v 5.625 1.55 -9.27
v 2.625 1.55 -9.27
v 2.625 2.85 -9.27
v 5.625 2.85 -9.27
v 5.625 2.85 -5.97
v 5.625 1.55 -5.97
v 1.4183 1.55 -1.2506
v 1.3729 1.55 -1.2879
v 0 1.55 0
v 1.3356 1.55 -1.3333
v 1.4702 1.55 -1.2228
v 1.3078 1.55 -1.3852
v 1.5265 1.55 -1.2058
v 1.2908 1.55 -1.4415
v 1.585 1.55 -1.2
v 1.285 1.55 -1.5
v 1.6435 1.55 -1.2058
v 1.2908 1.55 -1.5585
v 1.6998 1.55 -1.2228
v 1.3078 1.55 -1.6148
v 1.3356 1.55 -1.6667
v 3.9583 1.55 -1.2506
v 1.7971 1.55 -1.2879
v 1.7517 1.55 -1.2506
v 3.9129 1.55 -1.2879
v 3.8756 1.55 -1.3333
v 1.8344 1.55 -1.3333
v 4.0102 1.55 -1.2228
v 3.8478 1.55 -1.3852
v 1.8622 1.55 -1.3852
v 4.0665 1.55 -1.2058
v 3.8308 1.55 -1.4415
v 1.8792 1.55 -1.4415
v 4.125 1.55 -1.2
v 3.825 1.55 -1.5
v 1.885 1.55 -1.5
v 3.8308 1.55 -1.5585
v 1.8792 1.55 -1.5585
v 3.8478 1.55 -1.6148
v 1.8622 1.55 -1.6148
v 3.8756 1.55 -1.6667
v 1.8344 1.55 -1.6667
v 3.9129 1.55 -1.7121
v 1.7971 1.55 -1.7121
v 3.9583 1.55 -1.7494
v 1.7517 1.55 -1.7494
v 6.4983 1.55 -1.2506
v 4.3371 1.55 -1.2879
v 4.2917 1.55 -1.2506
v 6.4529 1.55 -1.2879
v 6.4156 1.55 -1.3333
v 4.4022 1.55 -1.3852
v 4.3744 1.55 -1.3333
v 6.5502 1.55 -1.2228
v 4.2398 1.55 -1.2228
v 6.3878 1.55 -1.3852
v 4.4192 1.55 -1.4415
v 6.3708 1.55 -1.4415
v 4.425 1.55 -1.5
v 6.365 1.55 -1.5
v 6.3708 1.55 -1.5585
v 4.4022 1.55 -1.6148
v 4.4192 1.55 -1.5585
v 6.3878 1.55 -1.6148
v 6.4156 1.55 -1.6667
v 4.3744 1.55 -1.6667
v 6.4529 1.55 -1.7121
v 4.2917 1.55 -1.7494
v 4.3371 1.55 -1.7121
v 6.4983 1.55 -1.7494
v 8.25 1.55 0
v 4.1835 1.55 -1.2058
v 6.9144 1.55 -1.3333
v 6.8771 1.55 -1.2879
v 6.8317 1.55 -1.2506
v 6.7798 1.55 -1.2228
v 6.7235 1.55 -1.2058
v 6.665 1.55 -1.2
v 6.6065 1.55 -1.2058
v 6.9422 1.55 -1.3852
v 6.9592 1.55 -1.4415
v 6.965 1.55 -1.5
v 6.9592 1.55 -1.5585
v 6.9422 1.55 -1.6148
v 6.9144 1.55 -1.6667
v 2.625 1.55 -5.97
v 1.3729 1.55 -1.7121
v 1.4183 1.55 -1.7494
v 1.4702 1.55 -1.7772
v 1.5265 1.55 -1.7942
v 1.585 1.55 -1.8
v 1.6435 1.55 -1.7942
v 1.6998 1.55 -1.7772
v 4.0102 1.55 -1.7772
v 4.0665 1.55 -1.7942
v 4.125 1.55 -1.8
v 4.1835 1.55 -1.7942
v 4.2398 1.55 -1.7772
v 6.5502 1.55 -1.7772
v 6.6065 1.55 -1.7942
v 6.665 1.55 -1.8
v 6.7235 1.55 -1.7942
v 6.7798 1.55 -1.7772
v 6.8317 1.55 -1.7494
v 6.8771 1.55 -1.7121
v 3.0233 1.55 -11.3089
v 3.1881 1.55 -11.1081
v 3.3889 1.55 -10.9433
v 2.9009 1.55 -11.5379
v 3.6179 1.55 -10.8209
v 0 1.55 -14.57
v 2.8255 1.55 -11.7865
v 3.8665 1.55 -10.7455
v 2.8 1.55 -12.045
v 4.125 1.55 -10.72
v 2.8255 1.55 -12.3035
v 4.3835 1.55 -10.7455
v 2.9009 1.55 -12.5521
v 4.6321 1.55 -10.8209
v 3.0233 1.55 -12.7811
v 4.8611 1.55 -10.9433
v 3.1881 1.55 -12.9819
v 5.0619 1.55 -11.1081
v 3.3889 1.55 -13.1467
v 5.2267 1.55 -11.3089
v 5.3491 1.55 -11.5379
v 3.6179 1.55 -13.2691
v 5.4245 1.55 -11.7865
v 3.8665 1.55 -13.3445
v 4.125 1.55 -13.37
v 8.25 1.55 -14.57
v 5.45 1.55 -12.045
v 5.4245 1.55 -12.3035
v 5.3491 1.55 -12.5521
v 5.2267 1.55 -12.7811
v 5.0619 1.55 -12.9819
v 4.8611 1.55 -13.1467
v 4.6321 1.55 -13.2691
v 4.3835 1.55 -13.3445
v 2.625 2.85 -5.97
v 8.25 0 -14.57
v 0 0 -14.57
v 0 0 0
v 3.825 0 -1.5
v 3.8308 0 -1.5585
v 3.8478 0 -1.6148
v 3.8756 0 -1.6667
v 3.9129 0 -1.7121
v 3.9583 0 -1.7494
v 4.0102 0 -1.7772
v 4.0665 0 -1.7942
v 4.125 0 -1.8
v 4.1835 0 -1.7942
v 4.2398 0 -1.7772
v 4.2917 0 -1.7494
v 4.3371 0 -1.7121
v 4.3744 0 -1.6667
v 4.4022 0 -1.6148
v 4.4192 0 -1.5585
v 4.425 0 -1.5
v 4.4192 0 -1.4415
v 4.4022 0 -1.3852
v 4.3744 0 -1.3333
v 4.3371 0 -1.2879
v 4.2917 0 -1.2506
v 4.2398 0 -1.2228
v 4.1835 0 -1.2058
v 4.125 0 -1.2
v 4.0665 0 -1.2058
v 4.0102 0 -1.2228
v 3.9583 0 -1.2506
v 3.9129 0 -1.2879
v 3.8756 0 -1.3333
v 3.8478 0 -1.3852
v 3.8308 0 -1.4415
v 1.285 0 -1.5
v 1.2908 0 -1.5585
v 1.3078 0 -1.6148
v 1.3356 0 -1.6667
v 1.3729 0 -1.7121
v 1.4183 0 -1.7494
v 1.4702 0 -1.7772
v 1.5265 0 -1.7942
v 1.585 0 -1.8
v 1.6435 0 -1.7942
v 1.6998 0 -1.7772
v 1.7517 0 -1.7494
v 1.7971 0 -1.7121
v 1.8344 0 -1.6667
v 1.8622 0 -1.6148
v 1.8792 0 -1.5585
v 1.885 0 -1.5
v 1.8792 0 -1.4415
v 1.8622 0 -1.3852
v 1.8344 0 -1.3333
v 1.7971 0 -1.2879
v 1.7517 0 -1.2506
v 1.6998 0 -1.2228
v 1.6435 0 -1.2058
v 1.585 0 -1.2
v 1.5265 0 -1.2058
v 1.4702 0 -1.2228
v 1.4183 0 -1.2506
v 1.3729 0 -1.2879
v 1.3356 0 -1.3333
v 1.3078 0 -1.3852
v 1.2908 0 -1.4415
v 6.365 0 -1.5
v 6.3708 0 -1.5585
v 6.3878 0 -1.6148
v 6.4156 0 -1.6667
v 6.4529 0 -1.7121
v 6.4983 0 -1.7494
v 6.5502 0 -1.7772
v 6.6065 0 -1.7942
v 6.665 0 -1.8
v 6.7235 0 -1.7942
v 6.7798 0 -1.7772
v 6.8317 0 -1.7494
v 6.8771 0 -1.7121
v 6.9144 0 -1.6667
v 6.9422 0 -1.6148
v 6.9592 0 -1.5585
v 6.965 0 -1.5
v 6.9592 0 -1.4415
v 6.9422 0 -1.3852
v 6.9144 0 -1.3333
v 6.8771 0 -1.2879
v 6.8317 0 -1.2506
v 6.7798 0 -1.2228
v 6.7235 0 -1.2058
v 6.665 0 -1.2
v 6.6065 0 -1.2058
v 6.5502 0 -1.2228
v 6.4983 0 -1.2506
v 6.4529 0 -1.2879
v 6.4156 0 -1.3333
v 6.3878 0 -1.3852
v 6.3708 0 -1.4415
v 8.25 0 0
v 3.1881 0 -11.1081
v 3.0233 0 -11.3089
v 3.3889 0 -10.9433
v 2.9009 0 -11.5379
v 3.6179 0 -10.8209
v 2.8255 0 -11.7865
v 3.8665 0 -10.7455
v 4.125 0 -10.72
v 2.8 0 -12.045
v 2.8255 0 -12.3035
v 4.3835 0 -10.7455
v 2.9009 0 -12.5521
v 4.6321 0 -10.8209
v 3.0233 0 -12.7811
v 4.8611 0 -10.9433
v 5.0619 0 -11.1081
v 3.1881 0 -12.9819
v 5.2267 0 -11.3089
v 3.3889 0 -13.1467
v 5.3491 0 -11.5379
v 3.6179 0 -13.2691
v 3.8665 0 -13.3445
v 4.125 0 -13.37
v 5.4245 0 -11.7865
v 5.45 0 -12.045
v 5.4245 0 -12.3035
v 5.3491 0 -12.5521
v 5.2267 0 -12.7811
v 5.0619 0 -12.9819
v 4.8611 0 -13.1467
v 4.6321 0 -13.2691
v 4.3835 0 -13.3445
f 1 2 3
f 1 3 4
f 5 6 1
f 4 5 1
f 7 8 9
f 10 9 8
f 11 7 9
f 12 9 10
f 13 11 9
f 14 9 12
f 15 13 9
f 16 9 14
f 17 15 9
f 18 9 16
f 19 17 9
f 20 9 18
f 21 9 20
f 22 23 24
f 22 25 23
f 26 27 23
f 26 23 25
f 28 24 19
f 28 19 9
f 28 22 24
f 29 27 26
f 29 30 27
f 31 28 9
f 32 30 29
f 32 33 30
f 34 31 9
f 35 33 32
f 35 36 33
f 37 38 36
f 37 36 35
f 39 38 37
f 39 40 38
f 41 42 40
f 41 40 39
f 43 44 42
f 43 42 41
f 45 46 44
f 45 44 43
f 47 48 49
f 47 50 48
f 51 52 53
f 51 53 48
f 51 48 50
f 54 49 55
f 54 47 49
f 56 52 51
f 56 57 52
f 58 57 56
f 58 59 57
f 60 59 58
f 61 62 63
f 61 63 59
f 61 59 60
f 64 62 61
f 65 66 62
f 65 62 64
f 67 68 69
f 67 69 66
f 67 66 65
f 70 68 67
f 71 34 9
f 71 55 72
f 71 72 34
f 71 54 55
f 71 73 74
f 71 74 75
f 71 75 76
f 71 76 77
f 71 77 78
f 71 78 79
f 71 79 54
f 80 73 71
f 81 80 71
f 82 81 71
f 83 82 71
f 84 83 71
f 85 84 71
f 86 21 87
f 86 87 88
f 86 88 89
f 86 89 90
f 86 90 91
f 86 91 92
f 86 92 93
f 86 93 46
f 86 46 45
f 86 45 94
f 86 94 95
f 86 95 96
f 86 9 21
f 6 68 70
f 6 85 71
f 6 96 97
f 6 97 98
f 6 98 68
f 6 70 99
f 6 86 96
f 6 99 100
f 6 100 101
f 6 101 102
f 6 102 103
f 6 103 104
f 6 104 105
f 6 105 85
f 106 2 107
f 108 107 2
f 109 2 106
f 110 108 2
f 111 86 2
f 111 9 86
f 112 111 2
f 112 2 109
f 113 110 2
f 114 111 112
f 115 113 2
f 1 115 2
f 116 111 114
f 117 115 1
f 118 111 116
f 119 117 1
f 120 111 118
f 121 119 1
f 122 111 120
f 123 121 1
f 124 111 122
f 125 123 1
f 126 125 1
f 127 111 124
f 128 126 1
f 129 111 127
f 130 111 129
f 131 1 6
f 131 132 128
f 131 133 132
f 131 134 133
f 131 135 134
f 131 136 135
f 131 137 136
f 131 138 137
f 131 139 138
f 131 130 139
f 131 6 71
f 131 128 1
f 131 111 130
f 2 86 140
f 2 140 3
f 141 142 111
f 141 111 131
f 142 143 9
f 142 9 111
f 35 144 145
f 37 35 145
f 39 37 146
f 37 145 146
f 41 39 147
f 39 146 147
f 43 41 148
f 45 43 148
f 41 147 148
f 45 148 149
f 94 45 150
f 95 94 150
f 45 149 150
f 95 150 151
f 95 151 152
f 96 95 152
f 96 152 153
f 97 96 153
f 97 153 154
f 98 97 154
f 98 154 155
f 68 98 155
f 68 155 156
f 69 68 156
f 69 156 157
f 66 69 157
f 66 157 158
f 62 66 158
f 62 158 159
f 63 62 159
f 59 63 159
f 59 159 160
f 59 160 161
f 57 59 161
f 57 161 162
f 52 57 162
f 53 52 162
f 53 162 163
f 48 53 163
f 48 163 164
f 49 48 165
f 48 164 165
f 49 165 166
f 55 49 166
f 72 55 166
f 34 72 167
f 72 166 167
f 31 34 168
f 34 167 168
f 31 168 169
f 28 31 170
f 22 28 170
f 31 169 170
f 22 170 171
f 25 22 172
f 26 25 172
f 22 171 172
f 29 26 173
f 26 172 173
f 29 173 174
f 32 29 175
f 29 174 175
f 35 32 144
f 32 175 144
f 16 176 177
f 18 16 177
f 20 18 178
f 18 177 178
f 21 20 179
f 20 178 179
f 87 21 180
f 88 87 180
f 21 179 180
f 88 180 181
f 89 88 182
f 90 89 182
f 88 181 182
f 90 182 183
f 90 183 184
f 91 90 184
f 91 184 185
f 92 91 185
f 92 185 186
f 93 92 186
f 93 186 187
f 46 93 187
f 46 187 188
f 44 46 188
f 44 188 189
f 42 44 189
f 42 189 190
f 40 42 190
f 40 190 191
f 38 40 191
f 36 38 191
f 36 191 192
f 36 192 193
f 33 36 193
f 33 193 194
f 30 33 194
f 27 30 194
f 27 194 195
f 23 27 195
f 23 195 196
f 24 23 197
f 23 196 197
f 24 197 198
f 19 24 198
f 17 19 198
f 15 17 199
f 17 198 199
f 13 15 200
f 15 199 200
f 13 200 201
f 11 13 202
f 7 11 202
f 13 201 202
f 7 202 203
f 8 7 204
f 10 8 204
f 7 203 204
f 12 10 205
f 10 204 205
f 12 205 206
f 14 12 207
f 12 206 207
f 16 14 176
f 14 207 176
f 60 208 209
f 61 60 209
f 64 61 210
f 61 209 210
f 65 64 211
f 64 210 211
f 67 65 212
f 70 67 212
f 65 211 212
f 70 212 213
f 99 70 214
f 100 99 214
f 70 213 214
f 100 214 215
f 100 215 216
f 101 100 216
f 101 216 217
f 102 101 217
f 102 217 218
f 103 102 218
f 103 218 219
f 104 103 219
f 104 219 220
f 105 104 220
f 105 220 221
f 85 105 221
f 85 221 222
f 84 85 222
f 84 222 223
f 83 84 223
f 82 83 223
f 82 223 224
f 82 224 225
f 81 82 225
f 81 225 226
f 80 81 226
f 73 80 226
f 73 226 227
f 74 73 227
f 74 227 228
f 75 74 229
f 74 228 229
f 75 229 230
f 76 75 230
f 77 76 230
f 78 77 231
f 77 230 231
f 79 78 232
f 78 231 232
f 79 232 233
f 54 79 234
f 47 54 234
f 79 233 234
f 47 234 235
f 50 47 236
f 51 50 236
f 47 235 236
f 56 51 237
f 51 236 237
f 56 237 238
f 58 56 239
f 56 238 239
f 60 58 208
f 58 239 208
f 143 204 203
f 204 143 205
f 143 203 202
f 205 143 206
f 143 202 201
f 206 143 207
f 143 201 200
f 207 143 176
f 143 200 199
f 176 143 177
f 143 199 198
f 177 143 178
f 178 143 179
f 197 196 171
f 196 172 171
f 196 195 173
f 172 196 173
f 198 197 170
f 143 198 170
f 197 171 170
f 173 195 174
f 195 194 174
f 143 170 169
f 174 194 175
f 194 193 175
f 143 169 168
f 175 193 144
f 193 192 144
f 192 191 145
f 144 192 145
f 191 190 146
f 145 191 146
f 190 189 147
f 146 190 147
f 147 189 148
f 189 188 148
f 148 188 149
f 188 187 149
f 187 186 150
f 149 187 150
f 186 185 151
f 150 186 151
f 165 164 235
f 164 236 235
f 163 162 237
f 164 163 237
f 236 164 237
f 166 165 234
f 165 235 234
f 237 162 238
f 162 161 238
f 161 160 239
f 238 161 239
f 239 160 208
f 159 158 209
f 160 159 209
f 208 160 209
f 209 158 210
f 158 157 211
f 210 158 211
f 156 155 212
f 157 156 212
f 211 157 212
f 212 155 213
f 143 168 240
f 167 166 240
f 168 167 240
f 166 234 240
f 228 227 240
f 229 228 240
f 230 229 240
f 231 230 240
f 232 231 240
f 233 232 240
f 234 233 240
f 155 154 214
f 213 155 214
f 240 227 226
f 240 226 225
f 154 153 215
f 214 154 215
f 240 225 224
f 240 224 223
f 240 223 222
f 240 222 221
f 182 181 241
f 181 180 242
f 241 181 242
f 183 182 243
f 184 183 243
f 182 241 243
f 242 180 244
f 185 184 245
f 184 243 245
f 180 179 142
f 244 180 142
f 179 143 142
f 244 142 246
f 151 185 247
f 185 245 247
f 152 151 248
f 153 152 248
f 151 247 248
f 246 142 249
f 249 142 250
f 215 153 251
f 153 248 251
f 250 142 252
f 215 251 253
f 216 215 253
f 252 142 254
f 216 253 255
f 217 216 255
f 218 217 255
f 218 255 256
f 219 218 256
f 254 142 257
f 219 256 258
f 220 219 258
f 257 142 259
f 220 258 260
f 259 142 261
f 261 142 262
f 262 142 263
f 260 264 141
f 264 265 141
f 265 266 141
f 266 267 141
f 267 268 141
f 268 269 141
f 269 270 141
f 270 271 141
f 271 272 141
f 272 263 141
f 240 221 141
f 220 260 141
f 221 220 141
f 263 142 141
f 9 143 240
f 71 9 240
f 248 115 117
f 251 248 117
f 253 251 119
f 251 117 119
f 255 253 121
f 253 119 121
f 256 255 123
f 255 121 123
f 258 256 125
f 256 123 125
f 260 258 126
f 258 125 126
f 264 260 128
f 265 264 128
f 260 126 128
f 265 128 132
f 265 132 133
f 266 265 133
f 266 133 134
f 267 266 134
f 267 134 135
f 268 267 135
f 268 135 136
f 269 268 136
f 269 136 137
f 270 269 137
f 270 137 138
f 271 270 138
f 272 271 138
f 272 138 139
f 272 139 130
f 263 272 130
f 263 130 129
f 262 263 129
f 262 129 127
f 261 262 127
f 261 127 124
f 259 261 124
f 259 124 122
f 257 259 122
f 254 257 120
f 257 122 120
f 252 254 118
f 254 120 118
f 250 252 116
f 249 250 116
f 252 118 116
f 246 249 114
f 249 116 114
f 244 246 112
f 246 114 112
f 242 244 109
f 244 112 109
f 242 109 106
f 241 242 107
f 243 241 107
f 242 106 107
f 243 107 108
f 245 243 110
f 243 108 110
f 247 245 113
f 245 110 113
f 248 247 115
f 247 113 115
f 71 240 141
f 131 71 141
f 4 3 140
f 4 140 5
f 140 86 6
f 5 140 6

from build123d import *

# Parameters (mm, degrees)
SKETCH1_W                      = 8.25
SKETCH1_H                      = 14.57
BOSS_EXTRUDE1_DEPTH            = 1.55
SKETCH2_R                      = 1.325
CUT_EXTRUDE1_DEPTH             = 17.815168747
SKETCH3_W                      = 3
SKETCH3_H                      = 3.3
BOSS_EXTRUDE2_DEPTH            = 1.3
F_0_6_0_6_DIAMETER_HOLE1_D     = 0.6
F_0_6_0_6_DIAMETER_HOLE1_DEPTH = 2
F_0_6_0_6_DIAMETER_HOLE1_TIP   = 0.180258186


with BuildPart() as part:
    # Sketch1 → Boss-Extrude1 (new body)
    with BuildSketch(Plane(origin=(0, 0, 0), x_dir=(1, 0, 0), z_dir=(0, 1, 0))):
        with Locations((4.125, 7.285)):
            Rectangle(SKETCH1_W, SKETCH1_H)
    extrude(amount=BOSS_EXTRUDE1_DEPTH)

    # Sketch2 → Cut-Extrude1 (cut, through all)
    with BuildSketch(Plane(origin=(0, 1.55, 0), x_dir=(1, 0, 0), z_dir=(0, 1, 0))):
        with Locations(Location((4.125, 12.045, 0), (0, 0, 270))):
            Circle(SKETCH2_R)
    extrude(amount=-CUT_EXTRUDE1_DEPTH, mode=Mode.SUBTRACT)

    # Sketch3 → Boss-Extrude2 (add)
    with BuildSketch(Plane(origin=(0, 1.55, 0), x_dir=(1, 0, 0), z_dir=(0, 1, 0))):
        with Locations((4.125, 7.62)):
            Rectangle(SKETCH3_W, SKETCH3_H)
    extrude(amount=BOSS_EXTRUDE2_DEPTH)

    # Ø0.6 (0.6) Diameter Hole1
    with Locations(Plane(origin=(0, 1.55, 0), x_dir=(1, 0, 0), z_dir=(0, 1, 0))):
        with Locations((4.125, 1.5), (1.585, 1.5), (6.665, 1.5)):
            Hole(F_0_6_0_6_DIAMETER_HOLE1_D / 2, depth=F_0_6_0_6_DIAMETER_HOLE1_DEPTH)
            with Locations((0, 0, -(F_0_6_0_6_DIAMETER_HOLE1_DEPTH + F_0_6_0_6_DIAMETER_HOLE1_TIP / 2))):  # 118° drill point
                Cone(0, F_0_6_0_6_DIAMETER_HOLE1_D / 2, F_0_6_0_6_DIAMETER_HOLE1_TIP, mode=Mode.SUBTRACT)


solid = part.part
